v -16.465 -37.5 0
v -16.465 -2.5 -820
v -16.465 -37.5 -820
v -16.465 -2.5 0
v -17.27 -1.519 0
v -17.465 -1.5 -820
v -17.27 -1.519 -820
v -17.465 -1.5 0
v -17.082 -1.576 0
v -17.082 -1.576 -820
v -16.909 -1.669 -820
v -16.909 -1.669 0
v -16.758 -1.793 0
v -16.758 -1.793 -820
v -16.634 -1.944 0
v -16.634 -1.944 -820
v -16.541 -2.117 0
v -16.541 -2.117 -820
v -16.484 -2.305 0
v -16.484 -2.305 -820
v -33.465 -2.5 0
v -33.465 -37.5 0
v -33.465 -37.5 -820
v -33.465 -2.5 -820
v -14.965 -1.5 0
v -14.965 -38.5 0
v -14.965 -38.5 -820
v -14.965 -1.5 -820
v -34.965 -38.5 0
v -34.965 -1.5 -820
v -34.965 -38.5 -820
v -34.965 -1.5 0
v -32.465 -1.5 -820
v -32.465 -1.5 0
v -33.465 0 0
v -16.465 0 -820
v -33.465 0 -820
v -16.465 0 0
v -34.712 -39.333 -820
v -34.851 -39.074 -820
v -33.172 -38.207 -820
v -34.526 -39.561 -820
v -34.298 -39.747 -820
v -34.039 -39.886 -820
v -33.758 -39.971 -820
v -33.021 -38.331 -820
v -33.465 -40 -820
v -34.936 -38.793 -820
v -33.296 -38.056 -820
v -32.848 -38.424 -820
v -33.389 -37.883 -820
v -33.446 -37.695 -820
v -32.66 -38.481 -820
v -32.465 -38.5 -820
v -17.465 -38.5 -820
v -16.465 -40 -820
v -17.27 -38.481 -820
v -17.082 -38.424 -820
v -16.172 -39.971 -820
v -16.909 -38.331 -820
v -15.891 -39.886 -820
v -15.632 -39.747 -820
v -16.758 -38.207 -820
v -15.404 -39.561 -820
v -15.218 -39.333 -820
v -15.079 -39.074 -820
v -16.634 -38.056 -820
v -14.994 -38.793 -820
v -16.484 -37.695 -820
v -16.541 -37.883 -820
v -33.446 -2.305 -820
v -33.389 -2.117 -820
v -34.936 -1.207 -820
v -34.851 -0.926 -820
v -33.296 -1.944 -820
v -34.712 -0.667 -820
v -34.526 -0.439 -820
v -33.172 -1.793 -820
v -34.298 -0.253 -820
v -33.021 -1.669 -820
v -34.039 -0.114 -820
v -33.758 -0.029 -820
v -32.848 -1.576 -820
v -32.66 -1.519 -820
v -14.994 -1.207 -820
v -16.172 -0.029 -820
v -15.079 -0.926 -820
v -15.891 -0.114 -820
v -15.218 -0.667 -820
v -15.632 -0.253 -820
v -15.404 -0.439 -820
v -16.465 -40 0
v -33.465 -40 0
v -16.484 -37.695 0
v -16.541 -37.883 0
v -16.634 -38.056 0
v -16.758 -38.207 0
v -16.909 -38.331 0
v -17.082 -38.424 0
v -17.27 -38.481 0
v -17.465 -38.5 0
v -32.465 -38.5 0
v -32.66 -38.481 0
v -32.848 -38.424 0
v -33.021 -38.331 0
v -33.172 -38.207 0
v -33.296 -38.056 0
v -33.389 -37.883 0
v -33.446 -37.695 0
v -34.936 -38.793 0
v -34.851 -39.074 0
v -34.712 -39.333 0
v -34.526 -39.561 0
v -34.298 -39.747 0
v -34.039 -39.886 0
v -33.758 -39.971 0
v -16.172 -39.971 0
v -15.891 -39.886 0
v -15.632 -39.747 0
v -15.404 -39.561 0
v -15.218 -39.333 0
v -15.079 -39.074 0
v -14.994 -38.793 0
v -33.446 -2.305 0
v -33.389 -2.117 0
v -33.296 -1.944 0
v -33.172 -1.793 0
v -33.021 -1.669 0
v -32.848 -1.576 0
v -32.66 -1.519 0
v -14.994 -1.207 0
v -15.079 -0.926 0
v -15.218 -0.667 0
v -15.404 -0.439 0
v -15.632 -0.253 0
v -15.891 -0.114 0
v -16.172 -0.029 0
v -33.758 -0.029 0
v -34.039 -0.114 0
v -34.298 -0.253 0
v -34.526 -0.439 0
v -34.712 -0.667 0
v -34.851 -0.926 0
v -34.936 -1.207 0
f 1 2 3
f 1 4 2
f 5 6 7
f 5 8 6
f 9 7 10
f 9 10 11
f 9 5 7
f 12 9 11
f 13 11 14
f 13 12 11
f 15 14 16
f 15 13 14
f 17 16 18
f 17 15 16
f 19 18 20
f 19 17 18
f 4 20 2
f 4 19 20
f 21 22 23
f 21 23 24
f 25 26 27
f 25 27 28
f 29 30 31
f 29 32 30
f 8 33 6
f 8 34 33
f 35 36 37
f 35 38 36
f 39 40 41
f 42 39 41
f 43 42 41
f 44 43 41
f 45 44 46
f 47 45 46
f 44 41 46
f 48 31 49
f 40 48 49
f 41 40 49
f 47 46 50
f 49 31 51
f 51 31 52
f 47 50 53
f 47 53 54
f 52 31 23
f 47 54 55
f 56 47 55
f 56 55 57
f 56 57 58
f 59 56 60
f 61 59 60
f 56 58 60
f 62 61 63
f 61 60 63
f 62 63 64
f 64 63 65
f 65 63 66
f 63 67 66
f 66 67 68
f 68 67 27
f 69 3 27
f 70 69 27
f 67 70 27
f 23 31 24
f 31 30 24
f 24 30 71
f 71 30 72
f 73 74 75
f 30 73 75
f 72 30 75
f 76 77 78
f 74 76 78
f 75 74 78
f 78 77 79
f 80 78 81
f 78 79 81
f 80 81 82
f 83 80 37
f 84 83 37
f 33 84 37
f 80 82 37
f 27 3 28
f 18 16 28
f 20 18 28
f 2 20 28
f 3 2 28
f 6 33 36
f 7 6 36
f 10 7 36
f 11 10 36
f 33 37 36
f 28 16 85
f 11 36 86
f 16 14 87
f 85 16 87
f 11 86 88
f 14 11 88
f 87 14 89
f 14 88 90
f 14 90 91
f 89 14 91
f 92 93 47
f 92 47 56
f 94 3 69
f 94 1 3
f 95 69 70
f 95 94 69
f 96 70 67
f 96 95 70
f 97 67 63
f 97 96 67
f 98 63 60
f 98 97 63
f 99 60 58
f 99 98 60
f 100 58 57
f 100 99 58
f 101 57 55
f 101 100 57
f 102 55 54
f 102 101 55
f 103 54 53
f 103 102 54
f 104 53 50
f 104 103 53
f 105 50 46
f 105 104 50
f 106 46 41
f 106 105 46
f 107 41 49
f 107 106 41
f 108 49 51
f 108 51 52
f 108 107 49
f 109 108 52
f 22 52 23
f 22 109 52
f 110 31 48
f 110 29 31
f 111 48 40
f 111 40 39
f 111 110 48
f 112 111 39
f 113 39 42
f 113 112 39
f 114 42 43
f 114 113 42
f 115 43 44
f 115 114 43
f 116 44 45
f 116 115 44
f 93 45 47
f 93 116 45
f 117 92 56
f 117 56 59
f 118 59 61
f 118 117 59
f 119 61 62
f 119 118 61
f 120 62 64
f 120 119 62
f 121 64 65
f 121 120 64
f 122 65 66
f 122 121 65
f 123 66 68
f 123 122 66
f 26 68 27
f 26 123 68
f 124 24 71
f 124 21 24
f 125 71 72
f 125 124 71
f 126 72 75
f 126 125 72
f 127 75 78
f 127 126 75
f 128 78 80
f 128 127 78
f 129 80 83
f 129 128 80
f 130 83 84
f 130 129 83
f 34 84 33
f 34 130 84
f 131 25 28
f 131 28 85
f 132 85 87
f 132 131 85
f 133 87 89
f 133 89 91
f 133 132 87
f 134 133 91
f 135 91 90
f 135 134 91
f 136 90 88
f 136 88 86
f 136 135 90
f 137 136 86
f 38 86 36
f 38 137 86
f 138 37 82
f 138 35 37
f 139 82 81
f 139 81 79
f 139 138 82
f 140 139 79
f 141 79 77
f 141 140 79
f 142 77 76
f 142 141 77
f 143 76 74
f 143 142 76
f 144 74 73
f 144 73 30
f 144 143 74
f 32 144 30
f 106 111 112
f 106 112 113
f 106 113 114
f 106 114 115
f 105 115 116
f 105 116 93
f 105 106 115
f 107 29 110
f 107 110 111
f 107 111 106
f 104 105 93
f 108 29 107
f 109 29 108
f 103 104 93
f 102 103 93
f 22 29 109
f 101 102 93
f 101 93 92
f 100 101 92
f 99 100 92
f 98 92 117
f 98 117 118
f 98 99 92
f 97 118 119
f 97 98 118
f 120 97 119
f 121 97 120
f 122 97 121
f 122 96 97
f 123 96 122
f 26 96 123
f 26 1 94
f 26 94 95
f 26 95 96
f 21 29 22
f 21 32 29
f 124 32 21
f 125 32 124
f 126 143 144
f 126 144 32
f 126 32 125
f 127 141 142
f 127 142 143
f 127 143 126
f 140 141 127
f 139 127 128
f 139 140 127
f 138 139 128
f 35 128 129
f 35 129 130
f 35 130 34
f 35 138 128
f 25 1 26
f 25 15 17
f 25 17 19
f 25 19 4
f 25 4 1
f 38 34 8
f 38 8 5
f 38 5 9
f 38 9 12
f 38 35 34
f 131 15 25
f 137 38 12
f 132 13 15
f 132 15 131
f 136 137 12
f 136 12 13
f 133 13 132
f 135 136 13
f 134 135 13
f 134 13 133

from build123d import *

# Parameters (mm, degrees)
EXTRUDE_START   = -410
EXTRUDE_1_DEPTH = 410


# Read off the part's stored shape, not the designer's step: Бобышка-Вытянуть1
with BuildPart() as part:
    # Бобышка-Вытянуть1 outline → Бобышка-Вытянуть1 (new body)
    with BuildSketch(Plane.XY.offset(EXTRUDE_START)):
        with BuildLine():
            ThreePointArc((-34.964986884, -38.5), (-34.525647056, -39.560660172), (-33.464986884, -40))
            Line((-33.464986884, -40), (-16.464986884, -40))
            ThreePointArc((-16.464986884, -40), (-15.404326712, -39.560660172), (-14.964986884, -38.5))
            Line((-14.964986884, -38.5), (-14.964986884, -1.5))
            ThreePointArc((-14.964986884, -1.5), (-15.404326712, -0.439339828), (-16.464986884, 0))
            Line((-16.464986884, 0), (-33.464986884, 0))
            ThreePointArc((-33.464986884, 0), (-34.525647056, -0.439339828), (-34.964986884, -1.5))
            Line((-34.964986884, -1.5), (-34.964986884, -38.5))
        make_face()
        with BuildLine():
            Line((-33.464986884, -37.5), (-33.464986884, -2.5))
            ThreePointArc((-33.464986884, -2.5), (-33.172093665, -1.792893219), (-32.464986884, -1.5))
            Line((-32.464986884, -1.5), (-17.464986884, -1.5))
            ThreePointArc((-17.464986884, -1.5), (-16.757880103, -1.792893219), (-16.464986884, -2.5))
            Line((-16.464986884, -2.5), (-16.464986884, -37.5))
            ThreePointArc((-16.464986884, -37.5), (-16.757880103, -38.207106781), (-17.464986884, -38.5))
            Line((-17.464986884, -38.5), (-32.464986884, -38.5))
            ThreePointArc((-32.464986884, -38.5), (-33.172093665, -38.207106781), (-33.464986884, -37.5))
        make_face(mode=Mode.SUBTRACT)
    extrude(amount=EXTRUDE_1_DEPTH)

    # Зеркальное отражение1: part across plane


with BuildPart() as part_1:
    add(part.part)
    add(part.part.mirror(Plane(origin=(441.299876816, -806.206552751, -410), x_dir=(1, 0, 0), z_dir=(0, 0, 1))))


solid = part_1.part
